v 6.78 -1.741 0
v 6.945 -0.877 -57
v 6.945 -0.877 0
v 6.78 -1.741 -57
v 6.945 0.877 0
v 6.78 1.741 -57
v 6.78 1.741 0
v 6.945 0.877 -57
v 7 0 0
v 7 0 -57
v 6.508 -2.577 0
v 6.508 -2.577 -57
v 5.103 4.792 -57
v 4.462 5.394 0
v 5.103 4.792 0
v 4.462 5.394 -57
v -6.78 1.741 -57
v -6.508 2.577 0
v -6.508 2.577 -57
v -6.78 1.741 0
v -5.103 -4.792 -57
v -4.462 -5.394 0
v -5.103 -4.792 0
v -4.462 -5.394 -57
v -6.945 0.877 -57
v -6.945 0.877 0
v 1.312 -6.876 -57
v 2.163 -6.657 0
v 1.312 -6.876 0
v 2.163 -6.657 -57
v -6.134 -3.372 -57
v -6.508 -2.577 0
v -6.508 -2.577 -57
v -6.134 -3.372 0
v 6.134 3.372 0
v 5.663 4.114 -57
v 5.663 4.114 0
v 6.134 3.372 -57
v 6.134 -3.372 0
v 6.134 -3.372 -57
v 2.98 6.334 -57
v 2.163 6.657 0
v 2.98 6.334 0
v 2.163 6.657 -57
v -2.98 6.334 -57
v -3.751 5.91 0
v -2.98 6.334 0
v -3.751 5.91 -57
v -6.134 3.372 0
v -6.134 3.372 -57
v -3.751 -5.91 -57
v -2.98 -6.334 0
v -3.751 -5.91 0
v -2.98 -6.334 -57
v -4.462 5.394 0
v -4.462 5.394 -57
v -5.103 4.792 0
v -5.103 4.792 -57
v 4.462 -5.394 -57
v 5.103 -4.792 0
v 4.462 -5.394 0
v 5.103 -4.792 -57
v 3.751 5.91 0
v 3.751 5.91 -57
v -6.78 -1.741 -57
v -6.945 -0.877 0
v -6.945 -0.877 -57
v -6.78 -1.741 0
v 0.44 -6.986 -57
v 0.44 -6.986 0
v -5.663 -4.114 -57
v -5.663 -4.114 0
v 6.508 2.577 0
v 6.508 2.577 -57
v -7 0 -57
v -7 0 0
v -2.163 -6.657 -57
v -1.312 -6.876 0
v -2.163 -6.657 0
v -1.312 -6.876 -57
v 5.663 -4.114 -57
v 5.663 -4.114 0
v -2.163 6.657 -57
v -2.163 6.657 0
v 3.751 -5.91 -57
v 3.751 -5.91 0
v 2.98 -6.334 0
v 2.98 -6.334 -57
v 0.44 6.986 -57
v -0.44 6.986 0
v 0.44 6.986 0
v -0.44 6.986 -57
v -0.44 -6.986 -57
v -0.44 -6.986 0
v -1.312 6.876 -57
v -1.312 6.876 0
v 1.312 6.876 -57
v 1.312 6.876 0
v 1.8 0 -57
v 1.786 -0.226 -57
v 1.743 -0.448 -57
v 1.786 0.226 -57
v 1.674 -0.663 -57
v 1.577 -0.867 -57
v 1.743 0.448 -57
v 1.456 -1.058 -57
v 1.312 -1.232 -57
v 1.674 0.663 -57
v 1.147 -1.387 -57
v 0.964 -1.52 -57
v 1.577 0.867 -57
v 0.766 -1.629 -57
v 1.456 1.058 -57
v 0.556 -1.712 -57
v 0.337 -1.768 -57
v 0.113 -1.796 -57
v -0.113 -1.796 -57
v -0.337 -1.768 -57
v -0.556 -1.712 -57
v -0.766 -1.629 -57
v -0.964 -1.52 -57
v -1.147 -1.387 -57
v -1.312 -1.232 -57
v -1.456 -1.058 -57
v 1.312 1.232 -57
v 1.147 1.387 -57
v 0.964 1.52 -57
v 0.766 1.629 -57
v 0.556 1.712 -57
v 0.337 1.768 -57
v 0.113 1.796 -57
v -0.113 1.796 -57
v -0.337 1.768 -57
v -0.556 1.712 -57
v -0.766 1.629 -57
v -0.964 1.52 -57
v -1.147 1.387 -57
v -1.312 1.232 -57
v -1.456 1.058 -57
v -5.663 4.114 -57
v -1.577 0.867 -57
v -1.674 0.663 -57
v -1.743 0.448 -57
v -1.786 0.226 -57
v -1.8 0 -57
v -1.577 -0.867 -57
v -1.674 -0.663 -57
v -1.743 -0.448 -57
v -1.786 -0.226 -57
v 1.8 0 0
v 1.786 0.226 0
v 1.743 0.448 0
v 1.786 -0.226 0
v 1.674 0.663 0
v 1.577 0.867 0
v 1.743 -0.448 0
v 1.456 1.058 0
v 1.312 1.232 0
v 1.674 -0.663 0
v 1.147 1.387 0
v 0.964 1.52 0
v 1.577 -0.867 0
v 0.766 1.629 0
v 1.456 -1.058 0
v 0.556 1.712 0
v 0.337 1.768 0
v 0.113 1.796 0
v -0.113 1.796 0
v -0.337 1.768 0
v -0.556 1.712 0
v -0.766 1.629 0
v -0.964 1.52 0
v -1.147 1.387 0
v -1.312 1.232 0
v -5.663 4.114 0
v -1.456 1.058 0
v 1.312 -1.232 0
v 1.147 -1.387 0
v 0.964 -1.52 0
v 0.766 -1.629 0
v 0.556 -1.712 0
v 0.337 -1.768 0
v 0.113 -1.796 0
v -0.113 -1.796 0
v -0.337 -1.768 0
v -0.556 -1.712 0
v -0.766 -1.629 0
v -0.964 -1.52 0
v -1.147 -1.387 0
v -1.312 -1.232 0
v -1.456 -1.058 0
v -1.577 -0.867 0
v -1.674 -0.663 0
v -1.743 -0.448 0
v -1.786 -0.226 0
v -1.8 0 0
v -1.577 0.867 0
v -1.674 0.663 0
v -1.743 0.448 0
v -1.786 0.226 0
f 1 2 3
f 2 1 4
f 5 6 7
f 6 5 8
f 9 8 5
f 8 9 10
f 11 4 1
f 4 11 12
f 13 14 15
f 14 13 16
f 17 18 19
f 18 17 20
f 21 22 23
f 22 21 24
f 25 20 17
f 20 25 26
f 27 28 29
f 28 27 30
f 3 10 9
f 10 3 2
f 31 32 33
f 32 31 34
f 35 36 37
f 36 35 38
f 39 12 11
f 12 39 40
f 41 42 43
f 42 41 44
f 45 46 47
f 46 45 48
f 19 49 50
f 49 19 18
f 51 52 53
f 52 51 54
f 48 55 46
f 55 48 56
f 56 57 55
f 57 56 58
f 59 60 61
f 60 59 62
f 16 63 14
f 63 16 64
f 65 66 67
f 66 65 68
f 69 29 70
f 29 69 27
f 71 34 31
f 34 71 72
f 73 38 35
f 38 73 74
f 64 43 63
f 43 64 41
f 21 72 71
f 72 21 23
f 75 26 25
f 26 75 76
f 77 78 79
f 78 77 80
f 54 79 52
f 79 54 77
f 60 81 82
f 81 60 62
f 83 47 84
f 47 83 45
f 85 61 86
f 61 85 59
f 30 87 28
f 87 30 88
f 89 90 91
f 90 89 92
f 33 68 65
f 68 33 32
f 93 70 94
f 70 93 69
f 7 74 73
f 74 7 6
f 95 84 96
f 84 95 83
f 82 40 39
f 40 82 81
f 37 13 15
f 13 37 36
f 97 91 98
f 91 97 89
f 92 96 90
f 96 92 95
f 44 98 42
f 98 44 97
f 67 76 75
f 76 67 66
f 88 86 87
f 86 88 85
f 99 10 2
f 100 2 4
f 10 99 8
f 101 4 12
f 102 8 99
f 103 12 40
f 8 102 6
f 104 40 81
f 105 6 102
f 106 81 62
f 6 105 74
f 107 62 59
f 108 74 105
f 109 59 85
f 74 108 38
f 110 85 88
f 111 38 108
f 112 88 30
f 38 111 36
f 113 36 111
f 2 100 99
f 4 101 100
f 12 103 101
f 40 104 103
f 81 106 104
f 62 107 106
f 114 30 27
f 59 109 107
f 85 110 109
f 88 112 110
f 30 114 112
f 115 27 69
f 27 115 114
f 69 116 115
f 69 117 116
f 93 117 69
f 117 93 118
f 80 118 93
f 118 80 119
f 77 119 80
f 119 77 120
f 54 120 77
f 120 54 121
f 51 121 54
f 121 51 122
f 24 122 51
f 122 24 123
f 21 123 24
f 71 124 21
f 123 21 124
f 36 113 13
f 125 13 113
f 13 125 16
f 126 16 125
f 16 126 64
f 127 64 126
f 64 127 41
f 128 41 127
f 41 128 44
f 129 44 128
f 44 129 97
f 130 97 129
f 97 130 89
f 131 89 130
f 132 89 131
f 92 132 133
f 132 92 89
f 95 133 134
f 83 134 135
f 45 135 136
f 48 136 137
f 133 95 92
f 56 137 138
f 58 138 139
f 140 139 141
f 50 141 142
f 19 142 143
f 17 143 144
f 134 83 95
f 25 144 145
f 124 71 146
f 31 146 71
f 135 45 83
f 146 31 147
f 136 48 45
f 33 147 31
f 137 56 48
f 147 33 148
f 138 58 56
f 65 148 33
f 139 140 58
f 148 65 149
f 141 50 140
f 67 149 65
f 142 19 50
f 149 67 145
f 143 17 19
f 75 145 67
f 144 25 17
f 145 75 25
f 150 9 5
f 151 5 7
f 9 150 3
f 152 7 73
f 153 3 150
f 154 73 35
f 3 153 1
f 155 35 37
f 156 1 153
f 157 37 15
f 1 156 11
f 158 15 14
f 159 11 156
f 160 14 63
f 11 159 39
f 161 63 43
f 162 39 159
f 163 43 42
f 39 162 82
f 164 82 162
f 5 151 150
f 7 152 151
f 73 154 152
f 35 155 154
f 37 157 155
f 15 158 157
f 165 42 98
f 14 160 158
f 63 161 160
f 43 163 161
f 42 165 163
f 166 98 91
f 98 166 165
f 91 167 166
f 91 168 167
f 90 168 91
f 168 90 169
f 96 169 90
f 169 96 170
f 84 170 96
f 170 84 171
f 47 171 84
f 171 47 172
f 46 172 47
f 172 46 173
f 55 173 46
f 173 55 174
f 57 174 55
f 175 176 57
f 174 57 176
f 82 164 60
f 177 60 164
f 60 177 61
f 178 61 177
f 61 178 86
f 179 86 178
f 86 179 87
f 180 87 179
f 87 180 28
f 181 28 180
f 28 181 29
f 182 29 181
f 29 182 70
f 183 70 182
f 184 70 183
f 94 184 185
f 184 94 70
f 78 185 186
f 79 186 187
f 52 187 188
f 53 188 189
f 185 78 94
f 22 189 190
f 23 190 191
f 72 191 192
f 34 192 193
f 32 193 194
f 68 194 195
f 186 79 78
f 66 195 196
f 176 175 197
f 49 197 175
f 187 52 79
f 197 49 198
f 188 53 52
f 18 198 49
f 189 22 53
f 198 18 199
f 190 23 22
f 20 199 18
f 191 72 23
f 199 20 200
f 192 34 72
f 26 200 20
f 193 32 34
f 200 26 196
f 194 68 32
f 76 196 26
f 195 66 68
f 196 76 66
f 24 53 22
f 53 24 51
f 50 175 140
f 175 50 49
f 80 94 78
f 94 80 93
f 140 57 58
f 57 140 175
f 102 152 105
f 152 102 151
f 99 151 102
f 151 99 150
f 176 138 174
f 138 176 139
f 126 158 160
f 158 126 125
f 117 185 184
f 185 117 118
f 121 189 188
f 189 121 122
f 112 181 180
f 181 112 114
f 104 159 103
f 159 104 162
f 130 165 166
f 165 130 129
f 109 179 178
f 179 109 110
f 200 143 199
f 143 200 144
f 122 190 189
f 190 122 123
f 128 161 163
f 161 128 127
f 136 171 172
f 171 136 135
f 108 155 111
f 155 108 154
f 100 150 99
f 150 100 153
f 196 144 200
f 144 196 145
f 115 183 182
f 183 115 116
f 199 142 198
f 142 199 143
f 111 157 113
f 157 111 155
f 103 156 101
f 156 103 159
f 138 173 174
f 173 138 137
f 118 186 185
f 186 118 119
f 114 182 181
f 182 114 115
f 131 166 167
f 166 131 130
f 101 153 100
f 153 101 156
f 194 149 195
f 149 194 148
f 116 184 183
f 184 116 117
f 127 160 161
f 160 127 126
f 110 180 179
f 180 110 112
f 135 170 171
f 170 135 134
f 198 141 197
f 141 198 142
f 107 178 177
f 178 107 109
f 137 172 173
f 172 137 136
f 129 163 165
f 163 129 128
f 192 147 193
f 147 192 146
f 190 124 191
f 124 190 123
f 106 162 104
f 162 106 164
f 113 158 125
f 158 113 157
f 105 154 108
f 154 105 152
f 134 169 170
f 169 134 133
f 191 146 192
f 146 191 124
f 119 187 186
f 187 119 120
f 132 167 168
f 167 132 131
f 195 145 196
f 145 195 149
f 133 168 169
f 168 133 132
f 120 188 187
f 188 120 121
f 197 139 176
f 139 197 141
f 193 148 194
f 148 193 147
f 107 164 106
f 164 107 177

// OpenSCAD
$fn = 50;


difference() {
	union() {
		translate(v = [0, 0, -57.0000000000]) {
			cylinder(h = 57, r = 7.0000000000);
		}
		cylinder(h = 0, r = 10.0000000000);
	}
	union() {
		#translate(v = [0, 0, -57]) {
			cylinder(h = 57, r = 1.8000000000);
		}
	}
}
